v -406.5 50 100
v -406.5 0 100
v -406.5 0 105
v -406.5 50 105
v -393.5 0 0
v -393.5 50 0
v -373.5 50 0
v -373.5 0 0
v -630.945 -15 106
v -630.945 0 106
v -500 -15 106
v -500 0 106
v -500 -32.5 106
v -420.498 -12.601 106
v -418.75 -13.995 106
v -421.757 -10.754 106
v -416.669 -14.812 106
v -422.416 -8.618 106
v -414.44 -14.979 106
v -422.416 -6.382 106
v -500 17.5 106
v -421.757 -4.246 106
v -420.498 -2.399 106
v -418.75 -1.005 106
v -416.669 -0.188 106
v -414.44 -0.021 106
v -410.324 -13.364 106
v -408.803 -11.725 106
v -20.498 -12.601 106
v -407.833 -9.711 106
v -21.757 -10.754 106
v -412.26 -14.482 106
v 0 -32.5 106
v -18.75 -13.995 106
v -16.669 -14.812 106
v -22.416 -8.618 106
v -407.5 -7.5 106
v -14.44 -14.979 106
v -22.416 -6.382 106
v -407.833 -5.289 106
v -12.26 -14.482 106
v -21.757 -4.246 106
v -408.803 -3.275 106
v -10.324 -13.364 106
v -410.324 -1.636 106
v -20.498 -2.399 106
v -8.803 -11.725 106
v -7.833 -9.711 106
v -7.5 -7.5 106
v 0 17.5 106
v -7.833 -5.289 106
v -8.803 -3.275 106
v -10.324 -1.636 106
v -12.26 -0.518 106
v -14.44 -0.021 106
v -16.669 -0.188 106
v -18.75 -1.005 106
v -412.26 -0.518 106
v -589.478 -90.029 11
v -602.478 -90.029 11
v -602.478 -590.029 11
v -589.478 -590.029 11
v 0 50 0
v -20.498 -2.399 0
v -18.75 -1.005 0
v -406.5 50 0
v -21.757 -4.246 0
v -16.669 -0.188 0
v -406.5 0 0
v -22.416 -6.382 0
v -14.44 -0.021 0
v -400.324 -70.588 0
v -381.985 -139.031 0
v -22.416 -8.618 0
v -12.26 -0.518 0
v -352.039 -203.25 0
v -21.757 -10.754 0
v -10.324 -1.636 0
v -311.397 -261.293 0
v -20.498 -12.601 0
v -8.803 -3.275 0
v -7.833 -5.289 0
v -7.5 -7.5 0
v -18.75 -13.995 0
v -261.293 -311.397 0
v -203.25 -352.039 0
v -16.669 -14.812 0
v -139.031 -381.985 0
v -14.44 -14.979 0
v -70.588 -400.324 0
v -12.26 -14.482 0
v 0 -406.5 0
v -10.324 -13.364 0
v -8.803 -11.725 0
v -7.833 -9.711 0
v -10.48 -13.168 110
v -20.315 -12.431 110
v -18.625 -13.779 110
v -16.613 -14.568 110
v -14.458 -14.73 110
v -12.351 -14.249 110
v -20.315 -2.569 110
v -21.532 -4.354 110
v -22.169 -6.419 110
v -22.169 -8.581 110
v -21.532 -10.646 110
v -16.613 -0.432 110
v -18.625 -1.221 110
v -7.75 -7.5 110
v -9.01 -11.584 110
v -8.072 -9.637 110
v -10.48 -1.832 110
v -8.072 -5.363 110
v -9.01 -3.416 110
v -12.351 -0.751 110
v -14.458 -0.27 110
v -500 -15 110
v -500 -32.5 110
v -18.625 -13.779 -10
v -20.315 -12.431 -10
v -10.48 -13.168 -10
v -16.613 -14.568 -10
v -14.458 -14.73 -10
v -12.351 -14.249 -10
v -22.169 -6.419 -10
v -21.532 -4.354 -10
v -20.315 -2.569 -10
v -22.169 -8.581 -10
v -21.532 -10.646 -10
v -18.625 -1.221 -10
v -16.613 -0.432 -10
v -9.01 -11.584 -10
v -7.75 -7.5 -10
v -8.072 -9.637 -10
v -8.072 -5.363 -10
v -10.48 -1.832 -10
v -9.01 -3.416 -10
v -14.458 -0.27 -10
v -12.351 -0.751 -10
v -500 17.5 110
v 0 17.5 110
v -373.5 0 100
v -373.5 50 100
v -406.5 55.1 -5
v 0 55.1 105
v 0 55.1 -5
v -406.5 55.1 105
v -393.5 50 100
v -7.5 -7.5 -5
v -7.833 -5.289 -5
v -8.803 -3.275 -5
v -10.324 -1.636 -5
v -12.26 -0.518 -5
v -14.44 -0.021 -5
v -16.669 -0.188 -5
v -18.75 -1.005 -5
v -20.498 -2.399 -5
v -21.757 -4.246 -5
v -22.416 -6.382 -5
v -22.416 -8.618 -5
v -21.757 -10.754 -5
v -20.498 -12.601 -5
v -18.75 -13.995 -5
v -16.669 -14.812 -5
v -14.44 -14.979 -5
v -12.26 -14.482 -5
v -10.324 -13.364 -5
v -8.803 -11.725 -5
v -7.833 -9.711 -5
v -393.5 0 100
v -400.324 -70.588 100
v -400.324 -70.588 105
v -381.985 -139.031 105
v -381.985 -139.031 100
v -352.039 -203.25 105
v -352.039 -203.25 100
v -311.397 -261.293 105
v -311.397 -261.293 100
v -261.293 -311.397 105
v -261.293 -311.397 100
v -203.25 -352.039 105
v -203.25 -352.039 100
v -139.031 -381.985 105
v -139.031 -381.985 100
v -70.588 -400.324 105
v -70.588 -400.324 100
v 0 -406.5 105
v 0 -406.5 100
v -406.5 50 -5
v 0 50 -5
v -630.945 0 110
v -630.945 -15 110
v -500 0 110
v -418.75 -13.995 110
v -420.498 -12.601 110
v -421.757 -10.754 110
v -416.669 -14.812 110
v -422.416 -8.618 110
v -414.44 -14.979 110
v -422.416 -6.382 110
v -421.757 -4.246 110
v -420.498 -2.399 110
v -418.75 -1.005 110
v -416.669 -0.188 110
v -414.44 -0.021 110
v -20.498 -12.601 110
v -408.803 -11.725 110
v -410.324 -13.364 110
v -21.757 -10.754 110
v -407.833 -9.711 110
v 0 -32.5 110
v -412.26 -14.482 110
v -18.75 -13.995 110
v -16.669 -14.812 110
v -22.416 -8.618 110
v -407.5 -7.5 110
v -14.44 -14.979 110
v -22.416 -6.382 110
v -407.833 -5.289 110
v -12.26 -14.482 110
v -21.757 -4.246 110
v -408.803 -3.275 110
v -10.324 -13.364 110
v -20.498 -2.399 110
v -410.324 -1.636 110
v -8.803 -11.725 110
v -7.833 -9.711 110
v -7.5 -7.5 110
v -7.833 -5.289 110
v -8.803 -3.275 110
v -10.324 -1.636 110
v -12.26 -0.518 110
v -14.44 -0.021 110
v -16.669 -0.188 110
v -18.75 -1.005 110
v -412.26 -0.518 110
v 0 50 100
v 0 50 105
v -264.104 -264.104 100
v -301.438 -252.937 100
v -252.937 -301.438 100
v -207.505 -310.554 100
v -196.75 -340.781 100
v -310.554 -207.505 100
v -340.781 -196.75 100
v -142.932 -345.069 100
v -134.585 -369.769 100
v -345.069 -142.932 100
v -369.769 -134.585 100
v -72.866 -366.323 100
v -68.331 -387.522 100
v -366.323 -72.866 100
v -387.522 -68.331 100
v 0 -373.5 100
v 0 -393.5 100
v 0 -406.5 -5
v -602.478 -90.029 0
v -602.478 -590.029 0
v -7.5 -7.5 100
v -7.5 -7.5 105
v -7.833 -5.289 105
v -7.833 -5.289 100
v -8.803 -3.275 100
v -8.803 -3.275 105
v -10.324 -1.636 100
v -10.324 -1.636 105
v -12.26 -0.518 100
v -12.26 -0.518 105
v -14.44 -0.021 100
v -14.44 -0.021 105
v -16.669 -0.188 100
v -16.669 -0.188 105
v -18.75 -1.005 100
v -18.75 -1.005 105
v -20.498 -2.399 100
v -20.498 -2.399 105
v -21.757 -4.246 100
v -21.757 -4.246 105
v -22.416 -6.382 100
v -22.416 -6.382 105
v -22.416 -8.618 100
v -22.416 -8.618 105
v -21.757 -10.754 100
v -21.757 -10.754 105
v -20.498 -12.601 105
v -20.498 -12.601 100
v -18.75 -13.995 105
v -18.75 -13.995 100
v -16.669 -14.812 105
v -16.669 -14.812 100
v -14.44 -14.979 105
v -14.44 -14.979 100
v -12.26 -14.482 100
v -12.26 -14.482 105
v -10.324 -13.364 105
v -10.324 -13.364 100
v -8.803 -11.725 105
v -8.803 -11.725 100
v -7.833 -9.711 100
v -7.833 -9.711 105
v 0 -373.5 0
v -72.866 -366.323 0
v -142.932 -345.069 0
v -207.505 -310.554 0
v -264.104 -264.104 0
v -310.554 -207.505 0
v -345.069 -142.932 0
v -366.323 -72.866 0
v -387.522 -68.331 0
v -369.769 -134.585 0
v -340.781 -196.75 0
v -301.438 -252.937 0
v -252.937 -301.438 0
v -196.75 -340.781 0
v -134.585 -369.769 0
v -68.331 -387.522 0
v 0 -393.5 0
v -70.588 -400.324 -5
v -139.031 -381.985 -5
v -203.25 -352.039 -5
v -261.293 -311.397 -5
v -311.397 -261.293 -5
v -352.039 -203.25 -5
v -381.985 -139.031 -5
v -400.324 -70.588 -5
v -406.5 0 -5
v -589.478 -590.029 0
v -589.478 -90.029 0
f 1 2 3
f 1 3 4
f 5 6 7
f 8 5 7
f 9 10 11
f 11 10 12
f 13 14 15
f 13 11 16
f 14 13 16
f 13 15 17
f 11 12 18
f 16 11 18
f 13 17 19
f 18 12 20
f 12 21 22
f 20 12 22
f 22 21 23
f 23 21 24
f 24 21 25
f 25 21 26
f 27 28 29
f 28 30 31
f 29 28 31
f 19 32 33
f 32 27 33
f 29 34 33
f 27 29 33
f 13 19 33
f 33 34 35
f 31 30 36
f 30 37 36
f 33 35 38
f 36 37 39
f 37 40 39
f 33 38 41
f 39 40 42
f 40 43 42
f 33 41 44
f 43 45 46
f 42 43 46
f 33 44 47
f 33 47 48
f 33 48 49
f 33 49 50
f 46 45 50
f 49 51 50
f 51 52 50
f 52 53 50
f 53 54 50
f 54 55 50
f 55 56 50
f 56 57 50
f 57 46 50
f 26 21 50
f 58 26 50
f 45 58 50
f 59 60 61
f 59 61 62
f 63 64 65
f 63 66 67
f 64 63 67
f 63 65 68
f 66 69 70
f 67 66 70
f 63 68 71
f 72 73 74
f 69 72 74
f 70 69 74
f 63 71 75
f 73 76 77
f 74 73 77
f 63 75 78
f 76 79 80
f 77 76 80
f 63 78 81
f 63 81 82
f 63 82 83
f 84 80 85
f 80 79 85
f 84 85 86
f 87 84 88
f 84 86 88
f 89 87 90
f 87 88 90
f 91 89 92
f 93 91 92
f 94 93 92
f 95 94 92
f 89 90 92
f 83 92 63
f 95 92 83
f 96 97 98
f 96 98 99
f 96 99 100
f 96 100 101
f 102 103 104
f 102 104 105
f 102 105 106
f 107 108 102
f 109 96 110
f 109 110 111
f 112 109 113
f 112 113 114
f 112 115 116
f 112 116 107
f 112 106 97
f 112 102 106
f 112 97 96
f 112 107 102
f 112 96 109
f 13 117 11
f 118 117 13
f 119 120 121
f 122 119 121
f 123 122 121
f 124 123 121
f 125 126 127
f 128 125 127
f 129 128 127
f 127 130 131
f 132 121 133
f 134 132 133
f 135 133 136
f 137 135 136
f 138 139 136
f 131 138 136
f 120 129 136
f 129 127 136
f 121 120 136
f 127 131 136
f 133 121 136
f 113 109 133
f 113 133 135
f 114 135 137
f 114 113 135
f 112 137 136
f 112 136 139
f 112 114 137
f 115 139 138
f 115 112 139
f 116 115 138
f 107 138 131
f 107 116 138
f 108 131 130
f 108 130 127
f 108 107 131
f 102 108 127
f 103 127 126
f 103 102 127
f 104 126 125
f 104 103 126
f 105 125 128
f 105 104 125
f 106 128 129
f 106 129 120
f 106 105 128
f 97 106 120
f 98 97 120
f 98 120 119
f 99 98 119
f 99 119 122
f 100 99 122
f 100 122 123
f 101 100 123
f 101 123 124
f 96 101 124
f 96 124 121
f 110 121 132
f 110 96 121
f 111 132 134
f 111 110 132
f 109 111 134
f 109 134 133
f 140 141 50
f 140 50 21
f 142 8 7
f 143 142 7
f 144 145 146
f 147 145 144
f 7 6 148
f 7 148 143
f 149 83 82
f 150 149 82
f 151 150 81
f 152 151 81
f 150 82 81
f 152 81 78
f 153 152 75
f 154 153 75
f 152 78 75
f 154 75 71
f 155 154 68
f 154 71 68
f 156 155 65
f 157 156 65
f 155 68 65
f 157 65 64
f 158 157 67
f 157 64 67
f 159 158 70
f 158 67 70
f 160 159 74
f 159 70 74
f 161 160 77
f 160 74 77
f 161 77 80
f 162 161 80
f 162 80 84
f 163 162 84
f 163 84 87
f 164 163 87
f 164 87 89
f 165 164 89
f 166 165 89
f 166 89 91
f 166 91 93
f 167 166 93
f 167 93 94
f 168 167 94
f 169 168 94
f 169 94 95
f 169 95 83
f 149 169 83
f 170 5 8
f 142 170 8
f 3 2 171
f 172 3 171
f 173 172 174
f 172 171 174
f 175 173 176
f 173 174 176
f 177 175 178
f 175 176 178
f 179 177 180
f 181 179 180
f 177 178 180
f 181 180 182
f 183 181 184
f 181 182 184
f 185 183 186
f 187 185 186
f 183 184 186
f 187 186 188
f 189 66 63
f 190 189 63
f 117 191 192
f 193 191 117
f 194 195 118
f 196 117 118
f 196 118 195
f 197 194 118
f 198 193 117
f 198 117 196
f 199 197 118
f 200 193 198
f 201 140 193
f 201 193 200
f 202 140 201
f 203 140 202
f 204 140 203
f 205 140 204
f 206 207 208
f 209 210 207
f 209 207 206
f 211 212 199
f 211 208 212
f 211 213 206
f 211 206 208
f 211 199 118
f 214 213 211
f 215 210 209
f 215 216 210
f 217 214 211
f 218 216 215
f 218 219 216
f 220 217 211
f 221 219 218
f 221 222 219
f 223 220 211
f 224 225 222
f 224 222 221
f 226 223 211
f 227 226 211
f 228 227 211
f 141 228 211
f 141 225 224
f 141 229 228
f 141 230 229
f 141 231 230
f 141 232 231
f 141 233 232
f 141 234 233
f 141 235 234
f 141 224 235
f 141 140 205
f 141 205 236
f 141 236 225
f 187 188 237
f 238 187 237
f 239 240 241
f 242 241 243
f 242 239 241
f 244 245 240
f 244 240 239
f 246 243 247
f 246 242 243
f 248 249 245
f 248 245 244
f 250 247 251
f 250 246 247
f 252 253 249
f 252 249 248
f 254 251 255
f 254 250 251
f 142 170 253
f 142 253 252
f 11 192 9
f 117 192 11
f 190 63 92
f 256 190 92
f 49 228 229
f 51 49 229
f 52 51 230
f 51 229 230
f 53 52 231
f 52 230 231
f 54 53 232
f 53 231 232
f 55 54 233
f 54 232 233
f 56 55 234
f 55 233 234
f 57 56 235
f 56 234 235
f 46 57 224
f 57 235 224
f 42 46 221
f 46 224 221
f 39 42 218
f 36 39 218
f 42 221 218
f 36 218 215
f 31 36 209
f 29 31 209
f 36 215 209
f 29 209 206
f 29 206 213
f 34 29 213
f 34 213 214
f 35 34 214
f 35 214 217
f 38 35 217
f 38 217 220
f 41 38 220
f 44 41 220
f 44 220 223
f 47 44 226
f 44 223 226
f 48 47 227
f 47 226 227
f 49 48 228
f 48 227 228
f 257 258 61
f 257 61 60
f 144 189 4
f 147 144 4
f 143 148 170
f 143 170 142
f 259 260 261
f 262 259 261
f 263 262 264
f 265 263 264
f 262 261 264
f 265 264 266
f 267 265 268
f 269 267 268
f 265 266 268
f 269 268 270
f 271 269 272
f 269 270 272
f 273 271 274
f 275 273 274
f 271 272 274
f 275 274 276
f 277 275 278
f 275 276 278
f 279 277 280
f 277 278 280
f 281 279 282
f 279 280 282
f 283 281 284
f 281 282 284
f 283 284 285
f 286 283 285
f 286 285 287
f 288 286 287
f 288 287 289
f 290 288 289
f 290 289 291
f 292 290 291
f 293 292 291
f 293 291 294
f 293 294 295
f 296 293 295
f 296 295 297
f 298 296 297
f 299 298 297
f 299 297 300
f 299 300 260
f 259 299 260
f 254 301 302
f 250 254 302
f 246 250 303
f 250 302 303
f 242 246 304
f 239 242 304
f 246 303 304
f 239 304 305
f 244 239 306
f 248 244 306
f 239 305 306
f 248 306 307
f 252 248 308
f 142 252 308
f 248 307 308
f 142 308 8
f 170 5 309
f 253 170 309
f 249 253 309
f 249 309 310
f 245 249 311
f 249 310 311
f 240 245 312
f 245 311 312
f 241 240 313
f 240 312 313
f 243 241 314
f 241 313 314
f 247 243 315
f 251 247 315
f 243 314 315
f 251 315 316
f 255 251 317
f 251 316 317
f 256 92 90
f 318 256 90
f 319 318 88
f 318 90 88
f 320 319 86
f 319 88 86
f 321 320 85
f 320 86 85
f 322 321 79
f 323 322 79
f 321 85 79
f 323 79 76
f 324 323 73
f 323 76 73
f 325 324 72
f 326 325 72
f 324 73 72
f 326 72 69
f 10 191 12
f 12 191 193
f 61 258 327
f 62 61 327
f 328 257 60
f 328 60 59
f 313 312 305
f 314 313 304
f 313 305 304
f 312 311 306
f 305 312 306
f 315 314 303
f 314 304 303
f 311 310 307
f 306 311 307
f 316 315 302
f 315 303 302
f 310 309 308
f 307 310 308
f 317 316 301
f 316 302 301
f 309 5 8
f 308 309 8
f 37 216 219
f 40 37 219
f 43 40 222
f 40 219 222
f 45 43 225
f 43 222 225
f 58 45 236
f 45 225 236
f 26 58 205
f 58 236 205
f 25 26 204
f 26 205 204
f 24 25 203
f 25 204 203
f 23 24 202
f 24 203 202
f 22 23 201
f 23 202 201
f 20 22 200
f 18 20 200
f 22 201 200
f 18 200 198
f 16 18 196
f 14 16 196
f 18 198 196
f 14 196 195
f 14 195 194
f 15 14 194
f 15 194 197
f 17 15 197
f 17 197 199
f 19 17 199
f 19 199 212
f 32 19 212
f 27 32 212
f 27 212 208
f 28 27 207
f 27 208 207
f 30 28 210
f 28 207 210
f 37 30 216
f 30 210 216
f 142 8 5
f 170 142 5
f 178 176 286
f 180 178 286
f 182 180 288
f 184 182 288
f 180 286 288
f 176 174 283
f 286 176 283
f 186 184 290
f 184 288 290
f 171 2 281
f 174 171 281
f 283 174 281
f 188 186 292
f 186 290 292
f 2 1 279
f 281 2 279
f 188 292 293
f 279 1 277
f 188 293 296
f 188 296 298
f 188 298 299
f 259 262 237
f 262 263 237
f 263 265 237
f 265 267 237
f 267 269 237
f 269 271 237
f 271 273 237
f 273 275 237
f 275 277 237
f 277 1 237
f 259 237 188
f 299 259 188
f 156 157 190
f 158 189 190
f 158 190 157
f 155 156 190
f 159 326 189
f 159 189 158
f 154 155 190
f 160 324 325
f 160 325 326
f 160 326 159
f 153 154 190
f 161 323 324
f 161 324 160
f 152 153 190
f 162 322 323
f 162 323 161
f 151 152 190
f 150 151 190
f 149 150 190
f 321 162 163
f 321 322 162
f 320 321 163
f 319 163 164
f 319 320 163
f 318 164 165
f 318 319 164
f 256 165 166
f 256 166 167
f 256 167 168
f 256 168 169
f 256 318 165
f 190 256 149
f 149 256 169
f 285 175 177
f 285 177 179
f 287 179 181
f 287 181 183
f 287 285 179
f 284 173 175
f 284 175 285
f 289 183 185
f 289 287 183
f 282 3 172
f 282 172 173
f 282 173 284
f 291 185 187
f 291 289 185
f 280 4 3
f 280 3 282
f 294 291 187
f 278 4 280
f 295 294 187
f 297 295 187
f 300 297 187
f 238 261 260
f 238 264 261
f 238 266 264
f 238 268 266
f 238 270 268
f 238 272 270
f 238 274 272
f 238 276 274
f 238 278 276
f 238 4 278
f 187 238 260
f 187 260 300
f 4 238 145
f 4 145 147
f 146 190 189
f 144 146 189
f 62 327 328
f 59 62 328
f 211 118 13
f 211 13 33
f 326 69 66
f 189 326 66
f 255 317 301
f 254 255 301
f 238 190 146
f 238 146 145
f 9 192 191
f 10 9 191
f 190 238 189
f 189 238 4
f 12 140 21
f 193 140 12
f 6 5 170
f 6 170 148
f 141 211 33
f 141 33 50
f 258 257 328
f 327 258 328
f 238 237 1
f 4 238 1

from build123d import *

# Parameters (mm, degrees)
F1_DEPTH  = 100
F4_DEPTH  = 5
F6_W      = 393.5
F6_H      = 50
F6_W_2    = 13
F7_DEPTH  = 5
F9_W      = 406.5
F9_H      = 110
F10_DEPTH = 5.1
F11_R     = 7.5
F12_DEPTH = 110.001
F14_R     = 7.25
F15_DEPTH = 120
F17_R     = 7.5
F17_W     = 130.9452056885
F17_H     = 15
F18_DEPTH = 4
F0_W      = 20
F0_H      = 50
F19_DEPTH = 100
F21_W     = 13
F21_H     = 500
F22_DEPTH = 11


# Not quite as in the source:
# - a feature names something its author has since deleted; it is built from what else it names
# - the program builds the solid bodies; features that only make, move or delete a surface that nothing else refers to are left out


with BuildPart() as f1:
    # F0 (on Top) → F1 (new body)
    with BuildSketch(Plane.XY):
        with BuildLine():
            ThreePointArc((0, -373.5), (-264.1043827732, -264.1043827732), (-373.5, 0))
            Line((-373.5, 0), (-393.5, 0))
            ThreePointArc((-393.5, 0), (-278.2465183969, -278.2465183969), (0, -393.5))
            Line((0, -393.5), (0, -373.5))
        make_face()
    extrude(amount=F1_DEPTH)


with BuildPart() as f4:
    # F3 (on offset) → F4 (new body)
    with BuildSketch(Plane(origin=(0, 0, 0), x_dir=(1, 0, 0), z_dir=(0, 0, -1))):
        with BuildLine():
            Line((-393.5, 0), (0, 0))
            Line((0, 0), (0, 393.5))
            ThreePointArc((0, 393.5), (-278.2465183969, 278.2465183969), (-393.5, 0))
        make_face()
        Polygon((0, -50), (0, 0), (-393.5, 0), (-406.5, 0), (-406.5, -50), align=None)
        with BuildLine():
            ThreePointArc((-393.5, 0), (-278.2465183969, 278.2465183969), (0, 393.5))
            Line((0, 393.5), (0, 406.5))
            ThreePointArc((0, 406.5), (-287.4389065523, 287.4389065523), (-406.5, 0))
            Line((-406.5, 0), (-393.5, 0))
        make_face()
    extrude(amount=F4_DEPTH)


with BuildPart() as f7:
    # F6 (on offset) → F7 (new body)
    with BuildSketch(Plane.XY.offset(100)):
        with BuildLine():
            Line((0, -393.5), (0, 0))
            Line((0, 0), (-393.5, 0))
            ThreePointArc((-393.5, 0), (-278.2465183969, -278.2465183969), (0, -393.5))
        make_face()
        with Locations((-196.75, 25)):
            Rectangle(F6_W, F6_H)
        with BuildLine():
            Line((0, -406.5), (0, -393.5))
            ThreePointArc((0, -393.5), (-278.2465183969, -278.2465183969), (-393.5, 0))
            Line((-393.5, 0), (-406.5, 0))
            ThreePointArc((-406.5, 0), (-287.4389065523, -287.4389065523), (0, -406.5))
        make_face()
        with Locations((-400, 25)):
            Rectangle(F6_W_2, F6_H)
    extrude(amount=F7_DEPTH)


with BuildPart() as f10:
    # F9 (on offset) → F10 (new body)
    with BuildSketch(Plane(origin=(0, 50, 0), x_dir=(-1, 0, 0), z_dir=(0, 1, 0))):
        with Locations((203.25, 50)):
            Rectangle(F9_W, F9_H)
    extrude(amount=F10_DEPTH)


with BuildPart() as f12_tool:
    # F11 (on face) → F12 (new body, through all)
    with BuildSketch(Plane.XY.offset(105)):
        with Locations((-15, -7.5)):
            Circle(F11_R)
    extrude(amount=-F12_DEPTH)


with BuildPart() as f4_1:
    add(f4.part)

    # F12: cut by f12_tool
    add(f12_tool.part, mode=Mode.SUBTRACT)


with BuildPart() as f7_1:
    add(f7.part)

    # F12: cut by f12_tool
    add(f12_tool.part, mode=Mode.SUBTRACT)


with BuildPart() as f15:
    # F14 (on offset) → F15 (new body)
    with BuildSketch(Plane.XY.offset(110)):
        with Locations((-15, -7.5)):
            Circle(F14_R)
    extrude(amount=-F15_DEPTH)


with BuildPart() as f18:
    # F17 (on offset) → F18 (new body)
    with BuildSketch(Plane.XY.offset(110)):
        Polygon((-500, -32.5), (0, -32.5), (0, 17.5), (-500, 17.5), (-500, 0), (-500, -15), align=None)
        with Locations((-415, -7.5)):
            Circle(F17_R, mode=Mode.SUBTRACT)
        with Locations((-15, -7.5)):
            Circle(F17_R, mode=Mode.SUBTRACT)
        with Locations((-565.4726028442, -7.5)):
            Rectangle(F17_W, F17_H)
    extrude(amount=-F18_DEPTH)


with BuildPart() as f19:
    # F0 (on Top) → F19 (new body)
    with BuildSketch(Plane.XY):
        with Locations((-383.5, 25)):
            Rectangle(F0_W, F0_H)
    extrude(amount=F19_DEPTH)


with BuildPart() as f22:
    # F21 (on Top) → F22 (new body)
    with BuildSketch(Plane.XY):
        with Locations((-595.9782657623, -340.0288820267)):
            Rectangle(F21_W, F21_H)
    extrude(amount=F22_DEPTH)


solid = Compound([f1.part, f10.part, f4_1.part, f7_1.part, f15.part, f18.part, f19.part, f22.part])
